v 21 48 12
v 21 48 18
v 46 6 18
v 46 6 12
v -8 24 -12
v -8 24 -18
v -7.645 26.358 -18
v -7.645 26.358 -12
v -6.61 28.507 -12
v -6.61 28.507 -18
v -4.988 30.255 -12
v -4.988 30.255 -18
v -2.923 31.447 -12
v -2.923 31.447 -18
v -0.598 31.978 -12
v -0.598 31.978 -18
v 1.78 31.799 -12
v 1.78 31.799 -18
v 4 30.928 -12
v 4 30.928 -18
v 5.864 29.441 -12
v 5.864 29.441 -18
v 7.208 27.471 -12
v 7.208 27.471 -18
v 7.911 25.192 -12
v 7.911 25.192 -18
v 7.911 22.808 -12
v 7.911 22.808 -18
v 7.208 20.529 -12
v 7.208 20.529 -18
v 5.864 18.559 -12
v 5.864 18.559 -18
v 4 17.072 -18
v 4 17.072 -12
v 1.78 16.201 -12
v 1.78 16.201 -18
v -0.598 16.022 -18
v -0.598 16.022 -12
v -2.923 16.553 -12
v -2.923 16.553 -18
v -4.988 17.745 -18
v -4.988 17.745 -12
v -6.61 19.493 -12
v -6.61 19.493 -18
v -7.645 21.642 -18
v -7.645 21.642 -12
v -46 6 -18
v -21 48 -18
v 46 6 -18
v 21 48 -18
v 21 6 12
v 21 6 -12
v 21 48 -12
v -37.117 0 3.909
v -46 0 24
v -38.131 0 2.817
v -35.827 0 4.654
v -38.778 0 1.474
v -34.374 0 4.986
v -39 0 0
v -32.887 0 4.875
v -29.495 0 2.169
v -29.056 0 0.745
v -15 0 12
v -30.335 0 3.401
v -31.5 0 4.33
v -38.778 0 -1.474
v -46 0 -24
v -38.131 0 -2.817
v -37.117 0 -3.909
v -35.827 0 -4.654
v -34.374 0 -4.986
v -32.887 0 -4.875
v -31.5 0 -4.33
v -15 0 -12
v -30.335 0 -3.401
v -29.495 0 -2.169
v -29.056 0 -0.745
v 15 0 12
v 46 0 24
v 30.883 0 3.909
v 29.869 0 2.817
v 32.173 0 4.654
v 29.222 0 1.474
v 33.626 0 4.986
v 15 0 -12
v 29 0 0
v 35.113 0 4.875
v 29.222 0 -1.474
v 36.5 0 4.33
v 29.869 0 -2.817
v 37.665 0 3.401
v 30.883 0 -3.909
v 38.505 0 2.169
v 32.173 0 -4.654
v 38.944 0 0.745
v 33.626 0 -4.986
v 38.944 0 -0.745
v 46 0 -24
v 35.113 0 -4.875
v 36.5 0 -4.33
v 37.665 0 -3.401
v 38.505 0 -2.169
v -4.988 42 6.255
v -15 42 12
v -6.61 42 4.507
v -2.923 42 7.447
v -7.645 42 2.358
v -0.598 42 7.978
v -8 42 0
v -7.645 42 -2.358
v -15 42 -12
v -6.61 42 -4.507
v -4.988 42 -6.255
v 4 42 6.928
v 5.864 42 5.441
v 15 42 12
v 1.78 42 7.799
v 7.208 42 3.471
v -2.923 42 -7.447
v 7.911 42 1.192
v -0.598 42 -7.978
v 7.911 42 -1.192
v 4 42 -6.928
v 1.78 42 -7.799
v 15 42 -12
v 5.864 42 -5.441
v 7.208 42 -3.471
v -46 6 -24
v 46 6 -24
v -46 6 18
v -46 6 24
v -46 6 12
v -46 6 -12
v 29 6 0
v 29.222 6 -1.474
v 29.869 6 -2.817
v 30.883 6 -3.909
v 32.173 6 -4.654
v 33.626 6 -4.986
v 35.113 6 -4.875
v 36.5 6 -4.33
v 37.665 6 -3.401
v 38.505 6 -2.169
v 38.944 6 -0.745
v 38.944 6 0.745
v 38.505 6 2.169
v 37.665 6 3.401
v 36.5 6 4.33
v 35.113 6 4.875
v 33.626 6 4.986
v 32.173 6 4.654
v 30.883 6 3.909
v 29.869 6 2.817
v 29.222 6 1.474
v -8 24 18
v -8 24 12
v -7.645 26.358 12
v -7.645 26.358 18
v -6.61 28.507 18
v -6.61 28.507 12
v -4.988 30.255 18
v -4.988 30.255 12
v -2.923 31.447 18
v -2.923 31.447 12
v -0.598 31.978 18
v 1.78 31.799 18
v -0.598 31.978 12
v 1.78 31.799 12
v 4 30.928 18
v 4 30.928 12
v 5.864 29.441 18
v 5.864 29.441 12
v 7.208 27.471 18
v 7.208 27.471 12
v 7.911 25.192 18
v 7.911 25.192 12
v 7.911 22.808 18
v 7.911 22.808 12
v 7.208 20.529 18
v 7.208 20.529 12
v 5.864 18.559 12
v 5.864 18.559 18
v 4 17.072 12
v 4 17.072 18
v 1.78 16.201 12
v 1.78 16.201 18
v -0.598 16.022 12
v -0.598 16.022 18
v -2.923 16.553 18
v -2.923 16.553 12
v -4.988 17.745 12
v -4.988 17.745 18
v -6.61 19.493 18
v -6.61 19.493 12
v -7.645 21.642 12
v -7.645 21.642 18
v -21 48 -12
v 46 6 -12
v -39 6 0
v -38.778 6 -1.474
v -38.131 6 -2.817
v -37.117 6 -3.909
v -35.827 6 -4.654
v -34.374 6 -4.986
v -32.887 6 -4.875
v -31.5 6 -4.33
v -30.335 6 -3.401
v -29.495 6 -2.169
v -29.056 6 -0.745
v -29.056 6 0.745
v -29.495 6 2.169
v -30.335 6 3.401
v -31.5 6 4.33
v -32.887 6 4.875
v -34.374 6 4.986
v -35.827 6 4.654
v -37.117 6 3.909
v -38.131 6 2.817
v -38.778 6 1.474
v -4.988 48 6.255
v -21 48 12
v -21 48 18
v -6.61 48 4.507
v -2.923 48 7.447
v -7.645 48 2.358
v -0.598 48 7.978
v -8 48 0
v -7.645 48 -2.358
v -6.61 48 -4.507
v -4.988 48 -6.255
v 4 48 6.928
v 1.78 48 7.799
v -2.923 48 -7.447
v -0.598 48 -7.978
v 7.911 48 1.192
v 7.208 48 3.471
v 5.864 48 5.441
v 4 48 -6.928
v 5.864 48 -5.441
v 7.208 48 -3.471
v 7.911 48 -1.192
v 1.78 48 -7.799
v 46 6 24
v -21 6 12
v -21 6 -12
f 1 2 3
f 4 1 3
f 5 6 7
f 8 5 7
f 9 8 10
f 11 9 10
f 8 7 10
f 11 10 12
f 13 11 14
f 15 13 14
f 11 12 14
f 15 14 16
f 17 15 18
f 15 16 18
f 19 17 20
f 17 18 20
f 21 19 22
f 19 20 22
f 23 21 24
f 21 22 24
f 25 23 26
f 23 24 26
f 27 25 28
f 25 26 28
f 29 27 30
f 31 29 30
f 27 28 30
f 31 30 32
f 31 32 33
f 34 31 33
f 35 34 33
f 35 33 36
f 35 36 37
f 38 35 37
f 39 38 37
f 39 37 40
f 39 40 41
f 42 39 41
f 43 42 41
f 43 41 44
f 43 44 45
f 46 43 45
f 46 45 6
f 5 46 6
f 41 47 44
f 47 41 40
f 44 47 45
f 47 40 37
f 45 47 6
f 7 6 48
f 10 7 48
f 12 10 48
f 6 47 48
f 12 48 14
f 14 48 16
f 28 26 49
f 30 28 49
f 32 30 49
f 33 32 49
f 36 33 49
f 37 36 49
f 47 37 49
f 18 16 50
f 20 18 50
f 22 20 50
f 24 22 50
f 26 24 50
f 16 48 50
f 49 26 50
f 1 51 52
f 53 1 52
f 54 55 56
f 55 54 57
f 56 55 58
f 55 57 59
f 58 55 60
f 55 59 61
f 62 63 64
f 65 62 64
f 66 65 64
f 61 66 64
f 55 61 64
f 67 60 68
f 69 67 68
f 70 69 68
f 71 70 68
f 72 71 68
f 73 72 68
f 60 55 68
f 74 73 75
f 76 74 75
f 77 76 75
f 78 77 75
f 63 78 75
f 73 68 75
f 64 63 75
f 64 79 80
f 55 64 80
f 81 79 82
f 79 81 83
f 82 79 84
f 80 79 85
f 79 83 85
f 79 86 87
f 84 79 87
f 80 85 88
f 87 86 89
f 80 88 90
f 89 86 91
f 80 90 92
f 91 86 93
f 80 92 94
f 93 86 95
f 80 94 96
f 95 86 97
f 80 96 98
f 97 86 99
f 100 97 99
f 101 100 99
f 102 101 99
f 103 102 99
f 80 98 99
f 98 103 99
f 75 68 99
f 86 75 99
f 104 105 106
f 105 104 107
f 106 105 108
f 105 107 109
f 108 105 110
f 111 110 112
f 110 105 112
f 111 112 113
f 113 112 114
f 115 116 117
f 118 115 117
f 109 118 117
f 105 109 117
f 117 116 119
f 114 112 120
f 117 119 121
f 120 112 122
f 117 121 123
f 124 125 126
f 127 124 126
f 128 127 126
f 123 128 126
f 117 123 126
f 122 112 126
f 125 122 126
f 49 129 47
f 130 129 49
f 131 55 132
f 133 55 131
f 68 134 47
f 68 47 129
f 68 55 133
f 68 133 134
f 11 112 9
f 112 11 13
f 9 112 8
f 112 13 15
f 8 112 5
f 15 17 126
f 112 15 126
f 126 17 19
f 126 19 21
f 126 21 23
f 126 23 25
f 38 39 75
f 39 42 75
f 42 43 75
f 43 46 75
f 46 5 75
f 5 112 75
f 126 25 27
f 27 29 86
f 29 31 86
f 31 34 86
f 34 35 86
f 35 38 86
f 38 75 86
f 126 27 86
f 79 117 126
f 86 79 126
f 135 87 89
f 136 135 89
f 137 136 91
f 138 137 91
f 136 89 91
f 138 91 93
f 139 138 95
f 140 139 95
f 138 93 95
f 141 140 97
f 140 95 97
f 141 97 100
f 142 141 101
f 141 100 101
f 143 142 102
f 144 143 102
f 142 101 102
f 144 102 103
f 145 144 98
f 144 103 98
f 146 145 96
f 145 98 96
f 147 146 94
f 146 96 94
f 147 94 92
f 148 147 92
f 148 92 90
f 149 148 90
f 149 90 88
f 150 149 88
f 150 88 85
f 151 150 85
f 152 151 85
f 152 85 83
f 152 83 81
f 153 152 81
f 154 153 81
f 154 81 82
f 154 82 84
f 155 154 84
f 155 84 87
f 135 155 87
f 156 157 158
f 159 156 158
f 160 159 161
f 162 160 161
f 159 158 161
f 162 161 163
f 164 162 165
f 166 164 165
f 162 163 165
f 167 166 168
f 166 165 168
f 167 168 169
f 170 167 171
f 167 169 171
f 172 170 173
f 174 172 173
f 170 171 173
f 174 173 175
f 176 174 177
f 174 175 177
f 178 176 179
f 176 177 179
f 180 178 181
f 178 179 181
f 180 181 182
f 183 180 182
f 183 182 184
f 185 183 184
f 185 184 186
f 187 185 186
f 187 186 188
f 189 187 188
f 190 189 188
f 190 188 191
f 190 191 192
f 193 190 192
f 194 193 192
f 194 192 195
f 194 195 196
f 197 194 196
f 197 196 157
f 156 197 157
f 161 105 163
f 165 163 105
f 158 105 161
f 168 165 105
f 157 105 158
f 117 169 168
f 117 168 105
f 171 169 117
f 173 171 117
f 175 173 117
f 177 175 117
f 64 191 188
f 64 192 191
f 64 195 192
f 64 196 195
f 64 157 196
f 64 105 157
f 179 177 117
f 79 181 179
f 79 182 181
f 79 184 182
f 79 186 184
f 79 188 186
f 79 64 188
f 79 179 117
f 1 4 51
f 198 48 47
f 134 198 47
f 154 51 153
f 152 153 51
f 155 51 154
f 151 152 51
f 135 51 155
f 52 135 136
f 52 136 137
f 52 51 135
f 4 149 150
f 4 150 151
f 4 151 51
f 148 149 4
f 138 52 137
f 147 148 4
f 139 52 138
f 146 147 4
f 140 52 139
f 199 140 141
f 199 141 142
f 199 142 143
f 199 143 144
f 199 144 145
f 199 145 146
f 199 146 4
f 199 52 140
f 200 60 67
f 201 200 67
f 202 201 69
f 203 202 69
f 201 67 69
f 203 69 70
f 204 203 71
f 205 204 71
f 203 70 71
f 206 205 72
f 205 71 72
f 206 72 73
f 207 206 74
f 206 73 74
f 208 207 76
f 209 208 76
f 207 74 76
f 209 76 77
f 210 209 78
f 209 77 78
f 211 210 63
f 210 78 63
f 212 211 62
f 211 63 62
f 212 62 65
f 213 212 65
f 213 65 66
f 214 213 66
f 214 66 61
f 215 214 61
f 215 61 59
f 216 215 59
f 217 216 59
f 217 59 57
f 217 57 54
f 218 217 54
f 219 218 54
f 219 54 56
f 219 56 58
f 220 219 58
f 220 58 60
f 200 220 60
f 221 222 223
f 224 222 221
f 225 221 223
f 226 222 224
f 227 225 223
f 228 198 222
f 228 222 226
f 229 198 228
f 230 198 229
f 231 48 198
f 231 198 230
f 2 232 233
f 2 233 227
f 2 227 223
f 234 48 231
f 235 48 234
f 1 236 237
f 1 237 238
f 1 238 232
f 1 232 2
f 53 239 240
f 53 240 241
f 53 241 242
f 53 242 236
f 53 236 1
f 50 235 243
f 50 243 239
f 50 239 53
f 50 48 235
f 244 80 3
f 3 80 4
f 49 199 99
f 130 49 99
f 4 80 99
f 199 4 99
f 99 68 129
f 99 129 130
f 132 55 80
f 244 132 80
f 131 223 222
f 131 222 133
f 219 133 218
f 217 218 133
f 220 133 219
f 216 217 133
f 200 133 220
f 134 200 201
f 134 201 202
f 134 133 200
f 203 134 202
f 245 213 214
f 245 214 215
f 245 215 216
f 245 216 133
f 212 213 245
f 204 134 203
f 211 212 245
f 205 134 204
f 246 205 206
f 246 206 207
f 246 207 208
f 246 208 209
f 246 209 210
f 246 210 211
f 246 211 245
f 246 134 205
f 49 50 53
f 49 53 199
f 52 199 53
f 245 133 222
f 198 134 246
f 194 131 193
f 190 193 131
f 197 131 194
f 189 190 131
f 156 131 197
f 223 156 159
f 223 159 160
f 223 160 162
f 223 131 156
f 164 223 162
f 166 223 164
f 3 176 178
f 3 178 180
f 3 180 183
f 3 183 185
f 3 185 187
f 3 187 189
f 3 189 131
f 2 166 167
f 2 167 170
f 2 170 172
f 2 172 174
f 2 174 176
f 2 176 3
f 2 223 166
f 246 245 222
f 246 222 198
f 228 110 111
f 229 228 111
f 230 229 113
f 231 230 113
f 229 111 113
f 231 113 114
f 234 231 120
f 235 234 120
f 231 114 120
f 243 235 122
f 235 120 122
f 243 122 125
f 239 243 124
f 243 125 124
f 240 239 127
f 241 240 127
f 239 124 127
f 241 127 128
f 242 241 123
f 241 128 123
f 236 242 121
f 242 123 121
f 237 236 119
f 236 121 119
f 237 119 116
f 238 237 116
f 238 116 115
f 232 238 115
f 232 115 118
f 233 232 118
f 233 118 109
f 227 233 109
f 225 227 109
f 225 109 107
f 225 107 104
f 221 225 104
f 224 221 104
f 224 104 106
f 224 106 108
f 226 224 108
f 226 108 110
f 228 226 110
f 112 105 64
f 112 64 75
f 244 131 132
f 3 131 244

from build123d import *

# Parameters (mm, degrees)
SCHIZZO1_W                   = 92
SCHIZZO1_H                   = 48
SCHIZZO1_W_2                 = 30
SCHIZZO1_H_2                 = 24
ESTRUSIONE_ESTRUSIONE1_DEPTH = 6
SCHIZZO2_W                   = 42
SCHIZZO2_H                   = 36
SCHIZZO2_W_2                 = 30
SCHIZZO2_H_2                 = 24
ESTRUSIONE_ESTRUSIONE2_DEPTH = 36
SCHIZZO3_W                   = 42
SCHIZZO3_H                   = 36
ESTRUSIONE_ESTRUSIONE3_DEPTH = 6
ESTRUSIONE_ESTRUSIONE4_DEPTH = 6
FORO_16_0_16_1_D             = 16
FORO_16_0_16_2_D             = 16
FORO_10_0_10_1_D             = 10


with BuildPart() as part:
    # Schizzo1 → Estrusione-Estrusione1 (new body)
    with BuildSketch(Plane(origin=(0, 0, 0), x_dir=(1, 0, 0), z_dir=(0, 1, 0))):
        Rectangle(SCHIZZO1_W, SCHIZZO1_H)
        Rectangle(SCHIZZO1_W_2, SCHIZZO1_H_2, mode=Mode.SUBTRACT)
    extrude(amount=ESTRUSIONE_ESTRUSIONE1_DEPTH)

    # Schizzo2 → Estrusione-Estrusione2 (add)
    with BuildSketch(Plane(origin=(0, 6, 0), x_dir=(1, 0, 0), z_dir=(0, 1, 0))):
        Rectangle(SCHIZZO2_W, SCHIZZO2_H)
        Rectangle(SCHIZZO2_W_2, SCHIZZO2_H_2, mode=Mode.SUBTRACT)
    extrude(amount=ESTRUSIONE_ESTRUSIONE2_DEPTH)

    # Schizzo3 → Estrusione-Estrusione3 (add)
    with BuildSketch(Plane(origin=(0, 42, 0), x_dir=(1, 0, 0), z_dir=(0, 1, 0))):
        Rectangle(SCHIZZO3_W, SCHIZZO3_H)
    extrude(amount=ESTRUSIONE_ESTRUSIONE3_DEPTH)

    # Schizzo4 → Estrusione-Estrusione4 (add)
    with BuildSketch(Plane.XY.offset(18)):
        Polygon((-21, 48), (-46, 6), (-21, 6), align=None)
        Polygon((21, 48), (46, 6), (21, 6), align=None)
    estrusione_estrusione4 = extrude(amount=-ESTRUSIONE_ESTRUSIONE4_DEPTH)

    # Specchia1: Estrusione-Estrusione4 across plane
    add(estrusione_estrusione4.mirror(Plane.XY))

    # Foro Ø16.0 (16)-1 (through all)
    with Locations(Plane.XY.offset(18)):
        with Locations((0, 24)):
            Hole(FORO_16_0_16_1_D / 2)

    # Foro Ø16.0 (16)-2 (through all)
    with Locations(Plane(origin=(0, 48, 0), x_dir=(1, 0, 0), z_dir=(0, 1, 0))):
        with Locations((0, 0)):
            Hole(FORO_16_0_16_2_D / 2)

    # Foro Ø10.0 (10)-1 (through all)
    with Locations(Plane(origin=(0, 6, 0), x_dir=(1, 0, 0), z_dir=(0, 1, 0))):
        with Locations((-34, 0), (34, 0)):
            Hole(FORO_10_0_10_1_D / 2)


solid = part.part
